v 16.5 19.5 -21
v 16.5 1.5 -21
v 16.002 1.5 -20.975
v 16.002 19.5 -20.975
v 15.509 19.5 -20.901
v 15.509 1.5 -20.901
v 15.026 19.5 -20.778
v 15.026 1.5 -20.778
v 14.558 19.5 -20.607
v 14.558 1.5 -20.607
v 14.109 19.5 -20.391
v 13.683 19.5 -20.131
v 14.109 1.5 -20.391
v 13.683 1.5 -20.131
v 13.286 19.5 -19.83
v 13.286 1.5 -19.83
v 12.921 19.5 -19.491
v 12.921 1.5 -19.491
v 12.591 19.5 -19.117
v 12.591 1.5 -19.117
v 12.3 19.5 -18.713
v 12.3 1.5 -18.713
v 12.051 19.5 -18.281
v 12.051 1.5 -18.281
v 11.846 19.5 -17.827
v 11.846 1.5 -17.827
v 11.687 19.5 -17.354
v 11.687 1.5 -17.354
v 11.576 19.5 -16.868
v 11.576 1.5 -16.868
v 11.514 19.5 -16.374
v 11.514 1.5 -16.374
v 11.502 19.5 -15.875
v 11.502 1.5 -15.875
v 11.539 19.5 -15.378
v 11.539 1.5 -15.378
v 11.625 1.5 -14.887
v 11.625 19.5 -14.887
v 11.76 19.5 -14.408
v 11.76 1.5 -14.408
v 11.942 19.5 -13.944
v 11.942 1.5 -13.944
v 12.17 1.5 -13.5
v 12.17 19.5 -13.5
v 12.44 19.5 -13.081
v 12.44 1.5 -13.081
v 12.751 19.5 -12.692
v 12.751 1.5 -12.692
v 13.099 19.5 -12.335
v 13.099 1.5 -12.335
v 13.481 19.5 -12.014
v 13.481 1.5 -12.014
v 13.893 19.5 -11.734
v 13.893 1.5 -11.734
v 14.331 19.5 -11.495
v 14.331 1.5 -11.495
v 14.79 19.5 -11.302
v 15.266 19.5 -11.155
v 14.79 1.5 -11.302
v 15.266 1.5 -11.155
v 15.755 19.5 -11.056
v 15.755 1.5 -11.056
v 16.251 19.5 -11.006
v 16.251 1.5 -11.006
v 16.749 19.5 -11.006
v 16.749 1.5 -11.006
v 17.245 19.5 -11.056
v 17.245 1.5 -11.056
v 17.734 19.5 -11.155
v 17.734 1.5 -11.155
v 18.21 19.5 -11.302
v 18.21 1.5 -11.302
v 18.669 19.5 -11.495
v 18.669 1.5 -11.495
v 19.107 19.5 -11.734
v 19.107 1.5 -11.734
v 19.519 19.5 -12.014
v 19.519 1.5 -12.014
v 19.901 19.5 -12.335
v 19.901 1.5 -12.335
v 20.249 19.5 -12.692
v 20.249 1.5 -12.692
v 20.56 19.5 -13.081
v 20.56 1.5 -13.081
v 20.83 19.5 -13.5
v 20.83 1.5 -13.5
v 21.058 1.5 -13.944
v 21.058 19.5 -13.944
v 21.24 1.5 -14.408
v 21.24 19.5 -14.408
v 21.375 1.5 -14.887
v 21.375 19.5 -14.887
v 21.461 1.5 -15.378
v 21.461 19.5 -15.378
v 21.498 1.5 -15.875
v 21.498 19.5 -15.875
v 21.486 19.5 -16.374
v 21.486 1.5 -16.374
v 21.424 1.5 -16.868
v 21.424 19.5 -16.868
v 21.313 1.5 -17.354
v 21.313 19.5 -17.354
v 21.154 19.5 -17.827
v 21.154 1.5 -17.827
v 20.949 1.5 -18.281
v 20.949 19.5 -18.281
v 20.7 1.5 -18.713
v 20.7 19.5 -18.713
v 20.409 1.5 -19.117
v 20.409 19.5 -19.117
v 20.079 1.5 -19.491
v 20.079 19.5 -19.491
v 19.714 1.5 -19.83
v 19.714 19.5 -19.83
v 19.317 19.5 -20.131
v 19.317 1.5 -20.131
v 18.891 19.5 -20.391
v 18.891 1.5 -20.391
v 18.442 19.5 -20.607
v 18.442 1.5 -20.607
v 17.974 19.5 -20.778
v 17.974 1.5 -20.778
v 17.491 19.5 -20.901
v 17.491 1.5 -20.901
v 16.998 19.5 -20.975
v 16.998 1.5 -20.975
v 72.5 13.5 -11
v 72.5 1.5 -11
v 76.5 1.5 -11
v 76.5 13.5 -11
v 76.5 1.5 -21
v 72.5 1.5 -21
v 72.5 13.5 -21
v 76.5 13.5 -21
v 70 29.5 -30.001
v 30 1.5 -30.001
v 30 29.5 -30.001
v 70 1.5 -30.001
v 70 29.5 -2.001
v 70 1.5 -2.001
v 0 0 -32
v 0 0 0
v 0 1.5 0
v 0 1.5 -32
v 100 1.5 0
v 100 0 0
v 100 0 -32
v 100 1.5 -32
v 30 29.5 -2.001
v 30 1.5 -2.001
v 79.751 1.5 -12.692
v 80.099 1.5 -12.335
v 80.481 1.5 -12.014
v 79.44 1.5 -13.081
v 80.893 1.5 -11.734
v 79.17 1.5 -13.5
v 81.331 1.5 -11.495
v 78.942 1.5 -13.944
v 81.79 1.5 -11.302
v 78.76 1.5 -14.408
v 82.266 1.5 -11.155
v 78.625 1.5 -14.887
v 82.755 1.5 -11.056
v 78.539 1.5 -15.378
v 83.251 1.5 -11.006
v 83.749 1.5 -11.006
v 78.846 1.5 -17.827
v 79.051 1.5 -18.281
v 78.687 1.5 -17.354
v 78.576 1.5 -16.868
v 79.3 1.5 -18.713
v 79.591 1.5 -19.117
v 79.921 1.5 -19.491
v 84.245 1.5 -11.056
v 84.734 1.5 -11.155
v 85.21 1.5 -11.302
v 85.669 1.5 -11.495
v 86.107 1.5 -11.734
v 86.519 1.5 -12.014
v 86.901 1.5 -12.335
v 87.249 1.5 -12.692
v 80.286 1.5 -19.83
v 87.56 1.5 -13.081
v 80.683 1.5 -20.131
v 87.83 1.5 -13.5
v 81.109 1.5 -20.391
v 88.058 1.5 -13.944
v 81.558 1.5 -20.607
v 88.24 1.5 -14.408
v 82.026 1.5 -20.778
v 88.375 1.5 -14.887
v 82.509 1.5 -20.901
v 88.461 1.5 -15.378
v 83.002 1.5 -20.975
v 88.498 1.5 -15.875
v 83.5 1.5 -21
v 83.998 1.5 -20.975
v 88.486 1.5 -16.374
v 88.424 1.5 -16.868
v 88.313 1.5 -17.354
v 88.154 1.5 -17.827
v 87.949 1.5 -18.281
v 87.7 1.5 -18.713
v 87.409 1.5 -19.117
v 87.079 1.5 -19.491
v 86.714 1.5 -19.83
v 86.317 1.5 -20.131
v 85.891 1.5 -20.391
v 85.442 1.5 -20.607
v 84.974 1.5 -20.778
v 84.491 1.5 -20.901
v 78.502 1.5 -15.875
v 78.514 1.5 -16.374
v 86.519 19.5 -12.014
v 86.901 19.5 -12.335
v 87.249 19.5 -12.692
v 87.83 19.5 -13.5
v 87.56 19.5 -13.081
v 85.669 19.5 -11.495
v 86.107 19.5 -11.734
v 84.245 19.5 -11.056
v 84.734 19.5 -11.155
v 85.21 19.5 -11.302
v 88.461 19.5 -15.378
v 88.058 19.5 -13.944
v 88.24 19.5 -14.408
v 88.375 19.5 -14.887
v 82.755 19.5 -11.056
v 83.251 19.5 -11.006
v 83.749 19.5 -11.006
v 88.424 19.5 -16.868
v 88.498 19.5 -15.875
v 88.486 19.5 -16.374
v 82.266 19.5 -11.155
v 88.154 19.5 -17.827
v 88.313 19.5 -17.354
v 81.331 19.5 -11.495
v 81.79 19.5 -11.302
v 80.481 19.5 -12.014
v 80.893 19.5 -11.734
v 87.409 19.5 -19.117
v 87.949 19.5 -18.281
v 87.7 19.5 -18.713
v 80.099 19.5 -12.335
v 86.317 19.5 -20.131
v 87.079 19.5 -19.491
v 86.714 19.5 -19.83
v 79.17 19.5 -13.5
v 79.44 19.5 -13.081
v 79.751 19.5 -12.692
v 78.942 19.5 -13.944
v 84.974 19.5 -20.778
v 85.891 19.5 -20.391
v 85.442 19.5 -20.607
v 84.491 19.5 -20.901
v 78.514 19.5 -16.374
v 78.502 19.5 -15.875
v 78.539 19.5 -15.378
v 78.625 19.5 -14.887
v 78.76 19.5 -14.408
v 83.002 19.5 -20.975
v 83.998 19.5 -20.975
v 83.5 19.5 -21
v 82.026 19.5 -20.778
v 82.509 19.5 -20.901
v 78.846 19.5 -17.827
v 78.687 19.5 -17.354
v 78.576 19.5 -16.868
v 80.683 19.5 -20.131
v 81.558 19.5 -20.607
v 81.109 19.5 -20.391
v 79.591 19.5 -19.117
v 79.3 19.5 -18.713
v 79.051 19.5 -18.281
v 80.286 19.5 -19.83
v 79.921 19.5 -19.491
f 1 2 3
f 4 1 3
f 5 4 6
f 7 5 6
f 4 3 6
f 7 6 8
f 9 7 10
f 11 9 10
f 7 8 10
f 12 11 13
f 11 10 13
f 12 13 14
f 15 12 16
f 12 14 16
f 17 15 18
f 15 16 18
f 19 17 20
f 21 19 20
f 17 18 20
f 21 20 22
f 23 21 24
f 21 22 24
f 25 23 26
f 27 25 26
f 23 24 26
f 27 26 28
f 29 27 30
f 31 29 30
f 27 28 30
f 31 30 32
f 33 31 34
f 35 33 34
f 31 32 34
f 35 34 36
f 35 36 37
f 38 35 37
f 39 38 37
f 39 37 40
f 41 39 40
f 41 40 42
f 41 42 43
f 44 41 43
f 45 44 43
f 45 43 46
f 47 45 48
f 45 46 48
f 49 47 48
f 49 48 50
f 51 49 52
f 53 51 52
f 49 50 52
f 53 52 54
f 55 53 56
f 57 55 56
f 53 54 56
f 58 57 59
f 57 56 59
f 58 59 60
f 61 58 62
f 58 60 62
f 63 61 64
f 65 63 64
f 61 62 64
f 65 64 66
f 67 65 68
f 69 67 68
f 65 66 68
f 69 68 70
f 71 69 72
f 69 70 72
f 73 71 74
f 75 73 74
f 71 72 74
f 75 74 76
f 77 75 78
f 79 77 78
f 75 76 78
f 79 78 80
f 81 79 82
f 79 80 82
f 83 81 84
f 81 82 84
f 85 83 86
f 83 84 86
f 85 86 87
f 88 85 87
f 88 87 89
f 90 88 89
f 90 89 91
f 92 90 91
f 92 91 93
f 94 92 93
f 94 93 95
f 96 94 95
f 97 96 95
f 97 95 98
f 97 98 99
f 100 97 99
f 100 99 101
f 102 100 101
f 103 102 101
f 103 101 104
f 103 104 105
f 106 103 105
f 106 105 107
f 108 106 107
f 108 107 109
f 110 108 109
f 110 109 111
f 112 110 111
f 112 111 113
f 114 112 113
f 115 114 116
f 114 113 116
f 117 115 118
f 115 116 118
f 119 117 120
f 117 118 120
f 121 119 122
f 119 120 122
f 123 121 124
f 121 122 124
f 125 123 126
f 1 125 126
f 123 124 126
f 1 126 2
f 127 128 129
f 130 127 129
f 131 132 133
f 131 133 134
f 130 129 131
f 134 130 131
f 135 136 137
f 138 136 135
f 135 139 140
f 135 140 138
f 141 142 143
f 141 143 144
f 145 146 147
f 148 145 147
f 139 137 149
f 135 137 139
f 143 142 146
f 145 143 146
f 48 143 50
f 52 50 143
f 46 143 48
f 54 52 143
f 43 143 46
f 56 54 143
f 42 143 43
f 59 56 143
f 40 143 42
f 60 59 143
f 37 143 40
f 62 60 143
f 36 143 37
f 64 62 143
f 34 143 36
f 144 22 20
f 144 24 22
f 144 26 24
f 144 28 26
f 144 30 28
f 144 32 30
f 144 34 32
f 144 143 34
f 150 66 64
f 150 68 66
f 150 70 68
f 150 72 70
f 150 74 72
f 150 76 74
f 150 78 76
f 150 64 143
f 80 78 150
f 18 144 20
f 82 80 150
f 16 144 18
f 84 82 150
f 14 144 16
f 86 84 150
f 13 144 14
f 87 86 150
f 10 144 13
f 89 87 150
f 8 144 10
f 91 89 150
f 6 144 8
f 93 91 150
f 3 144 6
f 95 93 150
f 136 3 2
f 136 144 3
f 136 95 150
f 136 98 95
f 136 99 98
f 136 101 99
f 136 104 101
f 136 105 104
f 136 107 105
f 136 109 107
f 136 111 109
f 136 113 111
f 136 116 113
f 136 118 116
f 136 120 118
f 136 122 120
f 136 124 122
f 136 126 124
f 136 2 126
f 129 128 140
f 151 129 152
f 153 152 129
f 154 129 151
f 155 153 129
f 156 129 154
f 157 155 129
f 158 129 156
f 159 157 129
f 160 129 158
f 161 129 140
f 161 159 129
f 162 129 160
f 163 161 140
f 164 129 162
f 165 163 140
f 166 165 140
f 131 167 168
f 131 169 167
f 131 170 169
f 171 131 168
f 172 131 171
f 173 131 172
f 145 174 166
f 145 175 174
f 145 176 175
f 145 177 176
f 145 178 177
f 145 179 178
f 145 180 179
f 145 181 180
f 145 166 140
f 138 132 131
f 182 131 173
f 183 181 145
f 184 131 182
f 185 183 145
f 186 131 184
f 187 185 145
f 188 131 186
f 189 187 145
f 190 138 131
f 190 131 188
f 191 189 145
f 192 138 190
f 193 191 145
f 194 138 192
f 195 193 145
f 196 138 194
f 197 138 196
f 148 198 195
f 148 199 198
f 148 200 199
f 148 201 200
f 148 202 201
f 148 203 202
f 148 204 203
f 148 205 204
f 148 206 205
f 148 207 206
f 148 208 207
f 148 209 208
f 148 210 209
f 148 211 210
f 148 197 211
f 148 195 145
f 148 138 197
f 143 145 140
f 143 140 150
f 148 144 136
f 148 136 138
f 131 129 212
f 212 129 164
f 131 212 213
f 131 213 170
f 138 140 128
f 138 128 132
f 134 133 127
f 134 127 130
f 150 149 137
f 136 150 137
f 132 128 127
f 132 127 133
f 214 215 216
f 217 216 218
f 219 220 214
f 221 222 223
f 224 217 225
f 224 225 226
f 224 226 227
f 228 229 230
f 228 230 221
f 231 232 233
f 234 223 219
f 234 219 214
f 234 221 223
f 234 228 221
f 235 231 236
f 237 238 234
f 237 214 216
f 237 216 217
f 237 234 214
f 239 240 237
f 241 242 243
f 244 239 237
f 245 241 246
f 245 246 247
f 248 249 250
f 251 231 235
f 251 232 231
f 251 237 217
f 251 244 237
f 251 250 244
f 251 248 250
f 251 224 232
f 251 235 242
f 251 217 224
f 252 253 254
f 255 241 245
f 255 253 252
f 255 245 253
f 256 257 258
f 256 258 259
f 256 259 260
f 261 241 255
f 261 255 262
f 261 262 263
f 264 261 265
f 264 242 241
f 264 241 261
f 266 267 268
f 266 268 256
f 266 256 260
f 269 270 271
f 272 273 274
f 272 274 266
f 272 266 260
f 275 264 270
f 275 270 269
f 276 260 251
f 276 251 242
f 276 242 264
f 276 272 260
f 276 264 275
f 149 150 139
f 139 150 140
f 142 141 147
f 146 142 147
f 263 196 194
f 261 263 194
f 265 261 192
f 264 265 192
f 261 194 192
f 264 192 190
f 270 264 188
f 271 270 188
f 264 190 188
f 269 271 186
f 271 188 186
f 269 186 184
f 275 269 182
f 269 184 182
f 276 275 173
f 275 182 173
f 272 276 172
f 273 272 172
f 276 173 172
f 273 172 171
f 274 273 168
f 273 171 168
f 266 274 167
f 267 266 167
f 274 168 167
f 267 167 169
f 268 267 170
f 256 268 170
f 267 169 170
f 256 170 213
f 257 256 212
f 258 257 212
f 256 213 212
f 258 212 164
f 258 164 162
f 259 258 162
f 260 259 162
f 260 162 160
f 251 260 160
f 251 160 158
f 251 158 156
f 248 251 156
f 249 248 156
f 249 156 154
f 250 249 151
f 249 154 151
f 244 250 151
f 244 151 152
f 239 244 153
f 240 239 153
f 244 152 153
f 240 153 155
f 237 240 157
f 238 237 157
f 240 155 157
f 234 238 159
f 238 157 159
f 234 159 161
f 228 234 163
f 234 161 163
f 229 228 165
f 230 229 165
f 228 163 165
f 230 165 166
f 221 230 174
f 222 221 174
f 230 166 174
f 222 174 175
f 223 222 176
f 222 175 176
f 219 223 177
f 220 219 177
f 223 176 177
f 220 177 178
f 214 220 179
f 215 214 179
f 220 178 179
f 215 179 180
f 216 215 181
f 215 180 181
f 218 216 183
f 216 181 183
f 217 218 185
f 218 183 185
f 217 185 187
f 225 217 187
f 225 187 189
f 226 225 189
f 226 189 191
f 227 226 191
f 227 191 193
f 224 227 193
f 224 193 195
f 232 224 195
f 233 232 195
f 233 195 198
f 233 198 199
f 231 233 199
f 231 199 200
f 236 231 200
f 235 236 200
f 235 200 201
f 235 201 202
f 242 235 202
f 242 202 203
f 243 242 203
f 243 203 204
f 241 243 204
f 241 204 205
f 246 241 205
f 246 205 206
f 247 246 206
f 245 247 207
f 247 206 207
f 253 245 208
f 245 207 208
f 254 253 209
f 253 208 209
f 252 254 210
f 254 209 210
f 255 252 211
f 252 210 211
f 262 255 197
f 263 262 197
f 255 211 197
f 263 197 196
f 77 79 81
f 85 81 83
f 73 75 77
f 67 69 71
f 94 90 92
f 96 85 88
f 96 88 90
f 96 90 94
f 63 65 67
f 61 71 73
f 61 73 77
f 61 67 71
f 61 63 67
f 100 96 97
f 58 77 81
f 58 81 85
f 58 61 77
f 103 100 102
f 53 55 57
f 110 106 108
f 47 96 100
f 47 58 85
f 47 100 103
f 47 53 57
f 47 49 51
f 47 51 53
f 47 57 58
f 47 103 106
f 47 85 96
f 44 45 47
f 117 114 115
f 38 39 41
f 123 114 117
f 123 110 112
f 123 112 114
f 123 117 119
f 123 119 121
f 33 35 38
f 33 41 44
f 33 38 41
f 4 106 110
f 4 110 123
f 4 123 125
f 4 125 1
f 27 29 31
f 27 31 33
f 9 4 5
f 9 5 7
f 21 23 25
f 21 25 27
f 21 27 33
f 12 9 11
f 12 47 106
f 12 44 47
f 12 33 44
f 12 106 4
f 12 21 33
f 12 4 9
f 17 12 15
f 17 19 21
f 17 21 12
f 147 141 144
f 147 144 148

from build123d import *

# Parameters (mm, degrees)
SKETCH_1_W      = 100
SKETCH_1_H      = 32
EXTRUDE_1_DEPTH = 1.5
SKETCH_2_W      = 40
SKETCH_2_H      = 28
EXTRUDE_2_DEPTH = 28
SKETCH_3_R      = 5
EXTRUDE_3_DEPTH = 18
SKETCH_4_W      = 4
SKETCH_4_H      = 10
EXTRUDE_4_DEPTH = 12


with BuildPart() as part:
    # 草图1 → 凸台-拉伸1 (new body)
    with BuildSketch(Plane(origin=(0, 0, 0), x_dir=(1, 0, 0), z_dir=(0, 1, 0))):
        with Locations((50, 16)):
            Rectangle(SKETCH_1_W, SKETCH_1_H)
    extrude(amount=EXTRUDE_1_DEPTH)

    # 草图2 → 凸台-拉伸2 (add)
    with BuildSketch(Plane(origin=(0, 1.5, 0), x_dir=(1, 0, 0), z_dir=(0, 1, 0))):
        with Locations((50, 16.000816198)):
            Rectangle(SKETCH_2_W, SKETCH_2_H)
    extrude(amount=EXTRUDE_2_DEPTH)

    # 草图3 → 凸台-拉伸3 (add)
    with BuildSketch(Plane(origin=(0, 1.5, 0), x_dir=(1, 0, 0), z_dir=(0, 1, 0))):
        with Locations(Location((16.5, 16, 0), (0, 0, 90))):
            Circle(SKETCH_3_R)
        with Locations(Location((83.5, 16, 0), (0, 0, 90))):
            Circle(SKETCH_3_R)
    extrude(amount=EXTRUDE_3_DEPTH)

    # 草图4 → 凸台-拉伸4 (add)
    with BuildSketch(Plane(origin=(0, 1.5, 0), x_dir=(1, 0, 0), z_dir=(0, 1, 0))):
        with Locations((74.5, 16)):
            Rectangle(SKETCH_4_W, SKETCH_4_H)
    extrude(amount=EXTRUDE_4_DEPTH)


solid = part.part
